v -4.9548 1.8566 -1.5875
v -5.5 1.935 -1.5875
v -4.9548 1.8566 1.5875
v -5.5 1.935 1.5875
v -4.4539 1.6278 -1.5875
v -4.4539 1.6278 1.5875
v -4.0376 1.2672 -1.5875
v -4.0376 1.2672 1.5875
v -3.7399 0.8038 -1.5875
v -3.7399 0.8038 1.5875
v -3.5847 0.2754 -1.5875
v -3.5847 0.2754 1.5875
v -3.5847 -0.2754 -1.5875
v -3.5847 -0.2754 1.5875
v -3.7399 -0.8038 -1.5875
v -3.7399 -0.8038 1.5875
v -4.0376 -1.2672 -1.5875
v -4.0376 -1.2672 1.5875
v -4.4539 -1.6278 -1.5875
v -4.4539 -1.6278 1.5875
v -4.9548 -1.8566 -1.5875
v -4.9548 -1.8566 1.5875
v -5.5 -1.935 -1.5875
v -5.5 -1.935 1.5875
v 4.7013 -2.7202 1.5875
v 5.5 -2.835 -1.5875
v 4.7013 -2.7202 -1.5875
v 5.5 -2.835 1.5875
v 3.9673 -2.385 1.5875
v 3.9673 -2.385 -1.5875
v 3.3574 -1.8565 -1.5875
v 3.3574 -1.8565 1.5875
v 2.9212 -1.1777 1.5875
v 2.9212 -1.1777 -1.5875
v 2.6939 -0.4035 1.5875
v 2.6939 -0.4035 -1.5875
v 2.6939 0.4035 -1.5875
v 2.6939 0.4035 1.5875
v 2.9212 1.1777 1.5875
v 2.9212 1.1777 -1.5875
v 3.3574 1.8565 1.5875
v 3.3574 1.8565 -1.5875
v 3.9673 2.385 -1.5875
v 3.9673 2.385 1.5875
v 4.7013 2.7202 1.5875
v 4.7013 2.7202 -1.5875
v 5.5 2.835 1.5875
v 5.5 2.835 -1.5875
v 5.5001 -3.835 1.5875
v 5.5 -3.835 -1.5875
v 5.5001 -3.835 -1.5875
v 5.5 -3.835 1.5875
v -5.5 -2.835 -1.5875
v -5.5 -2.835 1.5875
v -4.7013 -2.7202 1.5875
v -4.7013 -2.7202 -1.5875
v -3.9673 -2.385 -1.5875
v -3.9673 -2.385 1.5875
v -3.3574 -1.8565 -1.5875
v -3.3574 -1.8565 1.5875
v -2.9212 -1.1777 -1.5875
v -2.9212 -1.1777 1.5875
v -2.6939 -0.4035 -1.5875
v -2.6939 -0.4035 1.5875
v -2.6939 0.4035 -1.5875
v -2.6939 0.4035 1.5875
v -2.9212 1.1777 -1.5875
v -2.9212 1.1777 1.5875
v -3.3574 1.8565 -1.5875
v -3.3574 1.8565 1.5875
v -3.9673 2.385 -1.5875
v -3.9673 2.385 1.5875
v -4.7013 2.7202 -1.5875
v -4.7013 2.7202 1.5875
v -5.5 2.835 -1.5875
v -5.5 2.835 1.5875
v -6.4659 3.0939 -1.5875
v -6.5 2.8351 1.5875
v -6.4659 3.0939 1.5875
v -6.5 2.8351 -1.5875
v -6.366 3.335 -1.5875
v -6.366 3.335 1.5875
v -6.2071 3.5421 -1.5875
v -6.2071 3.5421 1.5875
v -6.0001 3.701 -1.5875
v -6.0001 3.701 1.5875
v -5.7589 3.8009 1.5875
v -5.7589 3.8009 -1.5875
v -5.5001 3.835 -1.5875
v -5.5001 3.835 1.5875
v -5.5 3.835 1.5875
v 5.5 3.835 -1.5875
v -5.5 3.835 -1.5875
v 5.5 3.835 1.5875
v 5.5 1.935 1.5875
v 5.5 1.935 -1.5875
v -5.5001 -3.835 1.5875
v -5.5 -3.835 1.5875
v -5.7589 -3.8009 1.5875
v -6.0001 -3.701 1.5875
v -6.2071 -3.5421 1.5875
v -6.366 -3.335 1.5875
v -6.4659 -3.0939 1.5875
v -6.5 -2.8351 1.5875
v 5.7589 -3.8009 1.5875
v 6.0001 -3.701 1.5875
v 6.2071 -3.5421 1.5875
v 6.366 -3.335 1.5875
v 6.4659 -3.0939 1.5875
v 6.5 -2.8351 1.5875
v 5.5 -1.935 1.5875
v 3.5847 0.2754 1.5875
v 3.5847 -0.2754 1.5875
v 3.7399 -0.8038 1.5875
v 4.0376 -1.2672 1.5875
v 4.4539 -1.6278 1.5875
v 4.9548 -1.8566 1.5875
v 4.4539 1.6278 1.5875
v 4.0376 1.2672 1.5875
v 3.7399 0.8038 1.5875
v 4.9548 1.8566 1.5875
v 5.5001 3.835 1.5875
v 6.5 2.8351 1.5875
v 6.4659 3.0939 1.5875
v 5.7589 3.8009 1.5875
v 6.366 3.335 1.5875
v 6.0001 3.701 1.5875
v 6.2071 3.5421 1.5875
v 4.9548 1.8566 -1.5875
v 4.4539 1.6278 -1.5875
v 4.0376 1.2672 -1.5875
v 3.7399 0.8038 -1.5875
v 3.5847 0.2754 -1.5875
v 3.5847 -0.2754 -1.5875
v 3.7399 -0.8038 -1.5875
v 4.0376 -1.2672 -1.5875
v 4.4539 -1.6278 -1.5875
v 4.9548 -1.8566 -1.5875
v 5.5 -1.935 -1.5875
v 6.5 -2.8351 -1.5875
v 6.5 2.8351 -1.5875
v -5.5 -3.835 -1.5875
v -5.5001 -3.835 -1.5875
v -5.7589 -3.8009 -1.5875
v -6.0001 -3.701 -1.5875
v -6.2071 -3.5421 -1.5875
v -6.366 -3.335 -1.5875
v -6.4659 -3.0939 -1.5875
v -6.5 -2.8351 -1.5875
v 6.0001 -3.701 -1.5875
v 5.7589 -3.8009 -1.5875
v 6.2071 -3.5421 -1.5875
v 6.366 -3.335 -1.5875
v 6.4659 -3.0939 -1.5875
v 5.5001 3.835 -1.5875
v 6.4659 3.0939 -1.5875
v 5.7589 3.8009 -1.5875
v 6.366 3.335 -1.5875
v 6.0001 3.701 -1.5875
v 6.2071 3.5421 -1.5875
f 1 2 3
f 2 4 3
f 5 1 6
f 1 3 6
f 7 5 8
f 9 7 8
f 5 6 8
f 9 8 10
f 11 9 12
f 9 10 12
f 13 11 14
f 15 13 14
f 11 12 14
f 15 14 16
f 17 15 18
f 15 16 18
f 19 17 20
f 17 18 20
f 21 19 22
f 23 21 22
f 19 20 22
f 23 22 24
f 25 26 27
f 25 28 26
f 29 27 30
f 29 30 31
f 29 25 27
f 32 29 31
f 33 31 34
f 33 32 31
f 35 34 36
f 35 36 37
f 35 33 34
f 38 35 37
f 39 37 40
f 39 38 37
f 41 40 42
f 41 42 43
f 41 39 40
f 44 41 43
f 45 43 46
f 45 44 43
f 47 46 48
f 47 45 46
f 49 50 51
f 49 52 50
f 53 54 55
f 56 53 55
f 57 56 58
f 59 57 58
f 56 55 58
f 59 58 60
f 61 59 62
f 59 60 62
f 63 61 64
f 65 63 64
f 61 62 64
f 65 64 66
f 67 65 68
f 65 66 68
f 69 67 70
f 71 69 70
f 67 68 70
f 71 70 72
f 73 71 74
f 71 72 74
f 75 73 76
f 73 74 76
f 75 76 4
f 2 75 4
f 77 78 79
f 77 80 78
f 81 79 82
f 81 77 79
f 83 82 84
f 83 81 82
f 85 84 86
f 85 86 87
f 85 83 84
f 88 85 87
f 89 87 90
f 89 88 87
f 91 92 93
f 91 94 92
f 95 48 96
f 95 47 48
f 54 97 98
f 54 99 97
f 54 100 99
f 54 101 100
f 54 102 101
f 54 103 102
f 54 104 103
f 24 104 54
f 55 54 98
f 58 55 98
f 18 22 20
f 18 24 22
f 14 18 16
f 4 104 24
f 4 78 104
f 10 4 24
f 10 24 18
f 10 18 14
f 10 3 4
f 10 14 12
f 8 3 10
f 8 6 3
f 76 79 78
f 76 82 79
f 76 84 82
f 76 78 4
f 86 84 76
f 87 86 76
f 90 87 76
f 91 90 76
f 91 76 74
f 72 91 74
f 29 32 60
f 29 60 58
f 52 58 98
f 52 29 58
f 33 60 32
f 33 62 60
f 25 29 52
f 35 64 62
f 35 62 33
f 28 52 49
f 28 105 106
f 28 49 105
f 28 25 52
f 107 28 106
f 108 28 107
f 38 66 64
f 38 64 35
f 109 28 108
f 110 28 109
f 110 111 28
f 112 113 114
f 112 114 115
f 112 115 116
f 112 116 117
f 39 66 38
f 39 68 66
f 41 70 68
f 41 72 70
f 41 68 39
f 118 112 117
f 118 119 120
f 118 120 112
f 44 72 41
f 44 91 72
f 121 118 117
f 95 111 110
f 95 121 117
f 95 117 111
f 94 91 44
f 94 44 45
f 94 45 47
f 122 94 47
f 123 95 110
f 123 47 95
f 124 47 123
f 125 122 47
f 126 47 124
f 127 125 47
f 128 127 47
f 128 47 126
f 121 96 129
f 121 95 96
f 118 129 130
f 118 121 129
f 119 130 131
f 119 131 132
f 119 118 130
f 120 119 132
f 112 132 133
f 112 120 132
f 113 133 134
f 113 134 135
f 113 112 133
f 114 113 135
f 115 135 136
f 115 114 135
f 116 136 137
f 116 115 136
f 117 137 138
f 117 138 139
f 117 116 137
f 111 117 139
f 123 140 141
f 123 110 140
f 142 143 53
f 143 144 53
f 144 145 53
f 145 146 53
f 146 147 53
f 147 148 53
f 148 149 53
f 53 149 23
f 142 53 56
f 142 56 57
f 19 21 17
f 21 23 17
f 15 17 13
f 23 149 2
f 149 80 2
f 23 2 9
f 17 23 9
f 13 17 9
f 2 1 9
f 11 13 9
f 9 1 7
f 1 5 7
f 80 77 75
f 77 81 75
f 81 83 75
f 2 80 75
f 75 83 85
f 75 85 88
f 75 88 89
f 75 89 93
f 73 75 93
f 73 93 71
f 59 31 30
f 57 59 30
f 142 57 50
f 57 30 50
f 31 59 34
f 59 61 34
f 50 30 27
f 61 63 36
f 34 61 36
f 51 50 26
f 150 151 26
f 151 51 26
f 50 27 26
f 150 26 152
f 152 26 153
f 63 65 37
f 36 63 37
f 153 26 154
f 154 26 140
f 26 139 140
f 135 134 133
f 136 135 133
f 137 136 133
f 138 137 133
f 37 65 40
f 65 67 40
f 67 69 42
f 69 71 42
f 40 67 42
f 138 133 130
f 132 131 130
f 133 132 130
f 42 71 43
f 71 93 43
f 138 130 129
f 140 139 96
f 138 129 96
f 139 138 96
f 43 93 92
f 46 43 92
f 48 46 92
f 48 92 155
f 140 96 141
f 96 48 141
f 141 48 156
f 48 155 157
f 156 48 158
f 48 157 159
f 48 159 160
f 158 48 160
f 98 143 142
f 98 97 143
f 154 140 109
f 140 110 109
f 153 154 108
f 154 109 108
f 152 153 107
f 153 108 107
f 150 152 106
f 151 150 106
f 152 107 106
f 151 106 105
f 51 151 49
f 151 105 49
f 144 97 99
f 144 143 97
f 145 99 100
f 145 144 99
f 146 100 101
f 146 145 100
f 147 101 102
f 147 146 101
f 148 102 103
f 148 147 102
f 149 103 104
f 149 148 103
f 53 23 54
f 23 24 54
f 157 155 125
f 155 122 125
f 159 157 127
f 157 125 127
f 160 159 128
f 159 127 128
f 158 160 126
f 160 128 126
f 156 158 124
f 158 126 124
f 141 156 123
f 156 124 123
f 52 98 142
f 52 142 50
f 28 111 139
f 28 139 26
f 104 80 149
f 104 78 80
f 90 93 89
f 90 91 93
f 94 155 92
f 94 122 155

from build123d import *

# Parameters (mm, degrees)
BOSS_EXTRUDE2_DEPTH = 1.5875
FILLET2_R           = 1


with BuildPart() as part:
    # Sketch1 → Boss-Extrude2 (new, symmetric)
    with BuildSketch(Plane.XY):
        with BuildLine():
            Line((-6.5, -1.935), (-6.5, -3.702326971))
            ThreePointArc((-6.5, -3.702326971), (-6.004381337, -3.801687055), (-5.5, -3.835))
            Line((-5.5, -3.835), (5.5, -3.835))
            ThreePointArc((5.5, -3.835), (6.004381337, -3.801687055), (6.5, -3.702326971))
            Line((6.5, -3.702326971), (6.5, -1.935))
            Line((6.5, -1.935), (6.5, 1.935))
            Line((6.5, 1.935), (6.5, 3.702326971))
            ThreePointArc((6.5, 3.702326971), (6.004381337, 3.801687055), (5.5, 3.835))
            Line((5.5, 3.835), (-5.5, 3.835))
            ThreePointArc((-5.5, 3.835), (-6.004381337, 3.801687055), (-6.5, 3.702326971))
            Line((-6.5, 3.702326971), (-6.5, 1.935))
            Line((-6.5, 1.935), (-6.5, -1.935))
        make_face()
        with BuildLine():
            Line((-5.5, 2.835), (-5.5, 1.935))
            ThreePointArc((-5.5, 1.935), (-3.565, 0), (-5.5, -1.935))
            Line((-5.5, -1.935), (-5.5, -2.835))
            ThreePointArc((-5.5, -2.835), (-2.665, 0), (-5.5, 2.835))
        make_face(mode=Mode.SUBTRACT)
        with BuildLine():
            Line((5.5, -1.935), (5.5, -2.835))
            ThreePointArc((5.5, -2.835), (2.665, 0), (5.5, 2.835))
            Line((5.5, 2.835), (5.5, 1.935))
            ThreePointArc((5.5, 1.935), (3.565, 0), (5.5, -1.935))
        make_face(mode=Mode.SUBTRACT)
    extrude(amount=BOSS_EXTRUDE2_DEPTH, both=True)

    # Fillet2
    fillet2_edges = [part.edges().sort_by_distance(p)[0] for p in [
        (6.5, -3.702326971, 0),
        (-6.5, -3.702326971, 0),
        (6.5, 3.702326971, 0),
        (-6.5, 3.702326971, 0),
    ]]
    fillet(fillet2_edges, radius=FILLET2_R - 0.0001)  # a hair under: the kernel refuses the full size


solid = part.part
